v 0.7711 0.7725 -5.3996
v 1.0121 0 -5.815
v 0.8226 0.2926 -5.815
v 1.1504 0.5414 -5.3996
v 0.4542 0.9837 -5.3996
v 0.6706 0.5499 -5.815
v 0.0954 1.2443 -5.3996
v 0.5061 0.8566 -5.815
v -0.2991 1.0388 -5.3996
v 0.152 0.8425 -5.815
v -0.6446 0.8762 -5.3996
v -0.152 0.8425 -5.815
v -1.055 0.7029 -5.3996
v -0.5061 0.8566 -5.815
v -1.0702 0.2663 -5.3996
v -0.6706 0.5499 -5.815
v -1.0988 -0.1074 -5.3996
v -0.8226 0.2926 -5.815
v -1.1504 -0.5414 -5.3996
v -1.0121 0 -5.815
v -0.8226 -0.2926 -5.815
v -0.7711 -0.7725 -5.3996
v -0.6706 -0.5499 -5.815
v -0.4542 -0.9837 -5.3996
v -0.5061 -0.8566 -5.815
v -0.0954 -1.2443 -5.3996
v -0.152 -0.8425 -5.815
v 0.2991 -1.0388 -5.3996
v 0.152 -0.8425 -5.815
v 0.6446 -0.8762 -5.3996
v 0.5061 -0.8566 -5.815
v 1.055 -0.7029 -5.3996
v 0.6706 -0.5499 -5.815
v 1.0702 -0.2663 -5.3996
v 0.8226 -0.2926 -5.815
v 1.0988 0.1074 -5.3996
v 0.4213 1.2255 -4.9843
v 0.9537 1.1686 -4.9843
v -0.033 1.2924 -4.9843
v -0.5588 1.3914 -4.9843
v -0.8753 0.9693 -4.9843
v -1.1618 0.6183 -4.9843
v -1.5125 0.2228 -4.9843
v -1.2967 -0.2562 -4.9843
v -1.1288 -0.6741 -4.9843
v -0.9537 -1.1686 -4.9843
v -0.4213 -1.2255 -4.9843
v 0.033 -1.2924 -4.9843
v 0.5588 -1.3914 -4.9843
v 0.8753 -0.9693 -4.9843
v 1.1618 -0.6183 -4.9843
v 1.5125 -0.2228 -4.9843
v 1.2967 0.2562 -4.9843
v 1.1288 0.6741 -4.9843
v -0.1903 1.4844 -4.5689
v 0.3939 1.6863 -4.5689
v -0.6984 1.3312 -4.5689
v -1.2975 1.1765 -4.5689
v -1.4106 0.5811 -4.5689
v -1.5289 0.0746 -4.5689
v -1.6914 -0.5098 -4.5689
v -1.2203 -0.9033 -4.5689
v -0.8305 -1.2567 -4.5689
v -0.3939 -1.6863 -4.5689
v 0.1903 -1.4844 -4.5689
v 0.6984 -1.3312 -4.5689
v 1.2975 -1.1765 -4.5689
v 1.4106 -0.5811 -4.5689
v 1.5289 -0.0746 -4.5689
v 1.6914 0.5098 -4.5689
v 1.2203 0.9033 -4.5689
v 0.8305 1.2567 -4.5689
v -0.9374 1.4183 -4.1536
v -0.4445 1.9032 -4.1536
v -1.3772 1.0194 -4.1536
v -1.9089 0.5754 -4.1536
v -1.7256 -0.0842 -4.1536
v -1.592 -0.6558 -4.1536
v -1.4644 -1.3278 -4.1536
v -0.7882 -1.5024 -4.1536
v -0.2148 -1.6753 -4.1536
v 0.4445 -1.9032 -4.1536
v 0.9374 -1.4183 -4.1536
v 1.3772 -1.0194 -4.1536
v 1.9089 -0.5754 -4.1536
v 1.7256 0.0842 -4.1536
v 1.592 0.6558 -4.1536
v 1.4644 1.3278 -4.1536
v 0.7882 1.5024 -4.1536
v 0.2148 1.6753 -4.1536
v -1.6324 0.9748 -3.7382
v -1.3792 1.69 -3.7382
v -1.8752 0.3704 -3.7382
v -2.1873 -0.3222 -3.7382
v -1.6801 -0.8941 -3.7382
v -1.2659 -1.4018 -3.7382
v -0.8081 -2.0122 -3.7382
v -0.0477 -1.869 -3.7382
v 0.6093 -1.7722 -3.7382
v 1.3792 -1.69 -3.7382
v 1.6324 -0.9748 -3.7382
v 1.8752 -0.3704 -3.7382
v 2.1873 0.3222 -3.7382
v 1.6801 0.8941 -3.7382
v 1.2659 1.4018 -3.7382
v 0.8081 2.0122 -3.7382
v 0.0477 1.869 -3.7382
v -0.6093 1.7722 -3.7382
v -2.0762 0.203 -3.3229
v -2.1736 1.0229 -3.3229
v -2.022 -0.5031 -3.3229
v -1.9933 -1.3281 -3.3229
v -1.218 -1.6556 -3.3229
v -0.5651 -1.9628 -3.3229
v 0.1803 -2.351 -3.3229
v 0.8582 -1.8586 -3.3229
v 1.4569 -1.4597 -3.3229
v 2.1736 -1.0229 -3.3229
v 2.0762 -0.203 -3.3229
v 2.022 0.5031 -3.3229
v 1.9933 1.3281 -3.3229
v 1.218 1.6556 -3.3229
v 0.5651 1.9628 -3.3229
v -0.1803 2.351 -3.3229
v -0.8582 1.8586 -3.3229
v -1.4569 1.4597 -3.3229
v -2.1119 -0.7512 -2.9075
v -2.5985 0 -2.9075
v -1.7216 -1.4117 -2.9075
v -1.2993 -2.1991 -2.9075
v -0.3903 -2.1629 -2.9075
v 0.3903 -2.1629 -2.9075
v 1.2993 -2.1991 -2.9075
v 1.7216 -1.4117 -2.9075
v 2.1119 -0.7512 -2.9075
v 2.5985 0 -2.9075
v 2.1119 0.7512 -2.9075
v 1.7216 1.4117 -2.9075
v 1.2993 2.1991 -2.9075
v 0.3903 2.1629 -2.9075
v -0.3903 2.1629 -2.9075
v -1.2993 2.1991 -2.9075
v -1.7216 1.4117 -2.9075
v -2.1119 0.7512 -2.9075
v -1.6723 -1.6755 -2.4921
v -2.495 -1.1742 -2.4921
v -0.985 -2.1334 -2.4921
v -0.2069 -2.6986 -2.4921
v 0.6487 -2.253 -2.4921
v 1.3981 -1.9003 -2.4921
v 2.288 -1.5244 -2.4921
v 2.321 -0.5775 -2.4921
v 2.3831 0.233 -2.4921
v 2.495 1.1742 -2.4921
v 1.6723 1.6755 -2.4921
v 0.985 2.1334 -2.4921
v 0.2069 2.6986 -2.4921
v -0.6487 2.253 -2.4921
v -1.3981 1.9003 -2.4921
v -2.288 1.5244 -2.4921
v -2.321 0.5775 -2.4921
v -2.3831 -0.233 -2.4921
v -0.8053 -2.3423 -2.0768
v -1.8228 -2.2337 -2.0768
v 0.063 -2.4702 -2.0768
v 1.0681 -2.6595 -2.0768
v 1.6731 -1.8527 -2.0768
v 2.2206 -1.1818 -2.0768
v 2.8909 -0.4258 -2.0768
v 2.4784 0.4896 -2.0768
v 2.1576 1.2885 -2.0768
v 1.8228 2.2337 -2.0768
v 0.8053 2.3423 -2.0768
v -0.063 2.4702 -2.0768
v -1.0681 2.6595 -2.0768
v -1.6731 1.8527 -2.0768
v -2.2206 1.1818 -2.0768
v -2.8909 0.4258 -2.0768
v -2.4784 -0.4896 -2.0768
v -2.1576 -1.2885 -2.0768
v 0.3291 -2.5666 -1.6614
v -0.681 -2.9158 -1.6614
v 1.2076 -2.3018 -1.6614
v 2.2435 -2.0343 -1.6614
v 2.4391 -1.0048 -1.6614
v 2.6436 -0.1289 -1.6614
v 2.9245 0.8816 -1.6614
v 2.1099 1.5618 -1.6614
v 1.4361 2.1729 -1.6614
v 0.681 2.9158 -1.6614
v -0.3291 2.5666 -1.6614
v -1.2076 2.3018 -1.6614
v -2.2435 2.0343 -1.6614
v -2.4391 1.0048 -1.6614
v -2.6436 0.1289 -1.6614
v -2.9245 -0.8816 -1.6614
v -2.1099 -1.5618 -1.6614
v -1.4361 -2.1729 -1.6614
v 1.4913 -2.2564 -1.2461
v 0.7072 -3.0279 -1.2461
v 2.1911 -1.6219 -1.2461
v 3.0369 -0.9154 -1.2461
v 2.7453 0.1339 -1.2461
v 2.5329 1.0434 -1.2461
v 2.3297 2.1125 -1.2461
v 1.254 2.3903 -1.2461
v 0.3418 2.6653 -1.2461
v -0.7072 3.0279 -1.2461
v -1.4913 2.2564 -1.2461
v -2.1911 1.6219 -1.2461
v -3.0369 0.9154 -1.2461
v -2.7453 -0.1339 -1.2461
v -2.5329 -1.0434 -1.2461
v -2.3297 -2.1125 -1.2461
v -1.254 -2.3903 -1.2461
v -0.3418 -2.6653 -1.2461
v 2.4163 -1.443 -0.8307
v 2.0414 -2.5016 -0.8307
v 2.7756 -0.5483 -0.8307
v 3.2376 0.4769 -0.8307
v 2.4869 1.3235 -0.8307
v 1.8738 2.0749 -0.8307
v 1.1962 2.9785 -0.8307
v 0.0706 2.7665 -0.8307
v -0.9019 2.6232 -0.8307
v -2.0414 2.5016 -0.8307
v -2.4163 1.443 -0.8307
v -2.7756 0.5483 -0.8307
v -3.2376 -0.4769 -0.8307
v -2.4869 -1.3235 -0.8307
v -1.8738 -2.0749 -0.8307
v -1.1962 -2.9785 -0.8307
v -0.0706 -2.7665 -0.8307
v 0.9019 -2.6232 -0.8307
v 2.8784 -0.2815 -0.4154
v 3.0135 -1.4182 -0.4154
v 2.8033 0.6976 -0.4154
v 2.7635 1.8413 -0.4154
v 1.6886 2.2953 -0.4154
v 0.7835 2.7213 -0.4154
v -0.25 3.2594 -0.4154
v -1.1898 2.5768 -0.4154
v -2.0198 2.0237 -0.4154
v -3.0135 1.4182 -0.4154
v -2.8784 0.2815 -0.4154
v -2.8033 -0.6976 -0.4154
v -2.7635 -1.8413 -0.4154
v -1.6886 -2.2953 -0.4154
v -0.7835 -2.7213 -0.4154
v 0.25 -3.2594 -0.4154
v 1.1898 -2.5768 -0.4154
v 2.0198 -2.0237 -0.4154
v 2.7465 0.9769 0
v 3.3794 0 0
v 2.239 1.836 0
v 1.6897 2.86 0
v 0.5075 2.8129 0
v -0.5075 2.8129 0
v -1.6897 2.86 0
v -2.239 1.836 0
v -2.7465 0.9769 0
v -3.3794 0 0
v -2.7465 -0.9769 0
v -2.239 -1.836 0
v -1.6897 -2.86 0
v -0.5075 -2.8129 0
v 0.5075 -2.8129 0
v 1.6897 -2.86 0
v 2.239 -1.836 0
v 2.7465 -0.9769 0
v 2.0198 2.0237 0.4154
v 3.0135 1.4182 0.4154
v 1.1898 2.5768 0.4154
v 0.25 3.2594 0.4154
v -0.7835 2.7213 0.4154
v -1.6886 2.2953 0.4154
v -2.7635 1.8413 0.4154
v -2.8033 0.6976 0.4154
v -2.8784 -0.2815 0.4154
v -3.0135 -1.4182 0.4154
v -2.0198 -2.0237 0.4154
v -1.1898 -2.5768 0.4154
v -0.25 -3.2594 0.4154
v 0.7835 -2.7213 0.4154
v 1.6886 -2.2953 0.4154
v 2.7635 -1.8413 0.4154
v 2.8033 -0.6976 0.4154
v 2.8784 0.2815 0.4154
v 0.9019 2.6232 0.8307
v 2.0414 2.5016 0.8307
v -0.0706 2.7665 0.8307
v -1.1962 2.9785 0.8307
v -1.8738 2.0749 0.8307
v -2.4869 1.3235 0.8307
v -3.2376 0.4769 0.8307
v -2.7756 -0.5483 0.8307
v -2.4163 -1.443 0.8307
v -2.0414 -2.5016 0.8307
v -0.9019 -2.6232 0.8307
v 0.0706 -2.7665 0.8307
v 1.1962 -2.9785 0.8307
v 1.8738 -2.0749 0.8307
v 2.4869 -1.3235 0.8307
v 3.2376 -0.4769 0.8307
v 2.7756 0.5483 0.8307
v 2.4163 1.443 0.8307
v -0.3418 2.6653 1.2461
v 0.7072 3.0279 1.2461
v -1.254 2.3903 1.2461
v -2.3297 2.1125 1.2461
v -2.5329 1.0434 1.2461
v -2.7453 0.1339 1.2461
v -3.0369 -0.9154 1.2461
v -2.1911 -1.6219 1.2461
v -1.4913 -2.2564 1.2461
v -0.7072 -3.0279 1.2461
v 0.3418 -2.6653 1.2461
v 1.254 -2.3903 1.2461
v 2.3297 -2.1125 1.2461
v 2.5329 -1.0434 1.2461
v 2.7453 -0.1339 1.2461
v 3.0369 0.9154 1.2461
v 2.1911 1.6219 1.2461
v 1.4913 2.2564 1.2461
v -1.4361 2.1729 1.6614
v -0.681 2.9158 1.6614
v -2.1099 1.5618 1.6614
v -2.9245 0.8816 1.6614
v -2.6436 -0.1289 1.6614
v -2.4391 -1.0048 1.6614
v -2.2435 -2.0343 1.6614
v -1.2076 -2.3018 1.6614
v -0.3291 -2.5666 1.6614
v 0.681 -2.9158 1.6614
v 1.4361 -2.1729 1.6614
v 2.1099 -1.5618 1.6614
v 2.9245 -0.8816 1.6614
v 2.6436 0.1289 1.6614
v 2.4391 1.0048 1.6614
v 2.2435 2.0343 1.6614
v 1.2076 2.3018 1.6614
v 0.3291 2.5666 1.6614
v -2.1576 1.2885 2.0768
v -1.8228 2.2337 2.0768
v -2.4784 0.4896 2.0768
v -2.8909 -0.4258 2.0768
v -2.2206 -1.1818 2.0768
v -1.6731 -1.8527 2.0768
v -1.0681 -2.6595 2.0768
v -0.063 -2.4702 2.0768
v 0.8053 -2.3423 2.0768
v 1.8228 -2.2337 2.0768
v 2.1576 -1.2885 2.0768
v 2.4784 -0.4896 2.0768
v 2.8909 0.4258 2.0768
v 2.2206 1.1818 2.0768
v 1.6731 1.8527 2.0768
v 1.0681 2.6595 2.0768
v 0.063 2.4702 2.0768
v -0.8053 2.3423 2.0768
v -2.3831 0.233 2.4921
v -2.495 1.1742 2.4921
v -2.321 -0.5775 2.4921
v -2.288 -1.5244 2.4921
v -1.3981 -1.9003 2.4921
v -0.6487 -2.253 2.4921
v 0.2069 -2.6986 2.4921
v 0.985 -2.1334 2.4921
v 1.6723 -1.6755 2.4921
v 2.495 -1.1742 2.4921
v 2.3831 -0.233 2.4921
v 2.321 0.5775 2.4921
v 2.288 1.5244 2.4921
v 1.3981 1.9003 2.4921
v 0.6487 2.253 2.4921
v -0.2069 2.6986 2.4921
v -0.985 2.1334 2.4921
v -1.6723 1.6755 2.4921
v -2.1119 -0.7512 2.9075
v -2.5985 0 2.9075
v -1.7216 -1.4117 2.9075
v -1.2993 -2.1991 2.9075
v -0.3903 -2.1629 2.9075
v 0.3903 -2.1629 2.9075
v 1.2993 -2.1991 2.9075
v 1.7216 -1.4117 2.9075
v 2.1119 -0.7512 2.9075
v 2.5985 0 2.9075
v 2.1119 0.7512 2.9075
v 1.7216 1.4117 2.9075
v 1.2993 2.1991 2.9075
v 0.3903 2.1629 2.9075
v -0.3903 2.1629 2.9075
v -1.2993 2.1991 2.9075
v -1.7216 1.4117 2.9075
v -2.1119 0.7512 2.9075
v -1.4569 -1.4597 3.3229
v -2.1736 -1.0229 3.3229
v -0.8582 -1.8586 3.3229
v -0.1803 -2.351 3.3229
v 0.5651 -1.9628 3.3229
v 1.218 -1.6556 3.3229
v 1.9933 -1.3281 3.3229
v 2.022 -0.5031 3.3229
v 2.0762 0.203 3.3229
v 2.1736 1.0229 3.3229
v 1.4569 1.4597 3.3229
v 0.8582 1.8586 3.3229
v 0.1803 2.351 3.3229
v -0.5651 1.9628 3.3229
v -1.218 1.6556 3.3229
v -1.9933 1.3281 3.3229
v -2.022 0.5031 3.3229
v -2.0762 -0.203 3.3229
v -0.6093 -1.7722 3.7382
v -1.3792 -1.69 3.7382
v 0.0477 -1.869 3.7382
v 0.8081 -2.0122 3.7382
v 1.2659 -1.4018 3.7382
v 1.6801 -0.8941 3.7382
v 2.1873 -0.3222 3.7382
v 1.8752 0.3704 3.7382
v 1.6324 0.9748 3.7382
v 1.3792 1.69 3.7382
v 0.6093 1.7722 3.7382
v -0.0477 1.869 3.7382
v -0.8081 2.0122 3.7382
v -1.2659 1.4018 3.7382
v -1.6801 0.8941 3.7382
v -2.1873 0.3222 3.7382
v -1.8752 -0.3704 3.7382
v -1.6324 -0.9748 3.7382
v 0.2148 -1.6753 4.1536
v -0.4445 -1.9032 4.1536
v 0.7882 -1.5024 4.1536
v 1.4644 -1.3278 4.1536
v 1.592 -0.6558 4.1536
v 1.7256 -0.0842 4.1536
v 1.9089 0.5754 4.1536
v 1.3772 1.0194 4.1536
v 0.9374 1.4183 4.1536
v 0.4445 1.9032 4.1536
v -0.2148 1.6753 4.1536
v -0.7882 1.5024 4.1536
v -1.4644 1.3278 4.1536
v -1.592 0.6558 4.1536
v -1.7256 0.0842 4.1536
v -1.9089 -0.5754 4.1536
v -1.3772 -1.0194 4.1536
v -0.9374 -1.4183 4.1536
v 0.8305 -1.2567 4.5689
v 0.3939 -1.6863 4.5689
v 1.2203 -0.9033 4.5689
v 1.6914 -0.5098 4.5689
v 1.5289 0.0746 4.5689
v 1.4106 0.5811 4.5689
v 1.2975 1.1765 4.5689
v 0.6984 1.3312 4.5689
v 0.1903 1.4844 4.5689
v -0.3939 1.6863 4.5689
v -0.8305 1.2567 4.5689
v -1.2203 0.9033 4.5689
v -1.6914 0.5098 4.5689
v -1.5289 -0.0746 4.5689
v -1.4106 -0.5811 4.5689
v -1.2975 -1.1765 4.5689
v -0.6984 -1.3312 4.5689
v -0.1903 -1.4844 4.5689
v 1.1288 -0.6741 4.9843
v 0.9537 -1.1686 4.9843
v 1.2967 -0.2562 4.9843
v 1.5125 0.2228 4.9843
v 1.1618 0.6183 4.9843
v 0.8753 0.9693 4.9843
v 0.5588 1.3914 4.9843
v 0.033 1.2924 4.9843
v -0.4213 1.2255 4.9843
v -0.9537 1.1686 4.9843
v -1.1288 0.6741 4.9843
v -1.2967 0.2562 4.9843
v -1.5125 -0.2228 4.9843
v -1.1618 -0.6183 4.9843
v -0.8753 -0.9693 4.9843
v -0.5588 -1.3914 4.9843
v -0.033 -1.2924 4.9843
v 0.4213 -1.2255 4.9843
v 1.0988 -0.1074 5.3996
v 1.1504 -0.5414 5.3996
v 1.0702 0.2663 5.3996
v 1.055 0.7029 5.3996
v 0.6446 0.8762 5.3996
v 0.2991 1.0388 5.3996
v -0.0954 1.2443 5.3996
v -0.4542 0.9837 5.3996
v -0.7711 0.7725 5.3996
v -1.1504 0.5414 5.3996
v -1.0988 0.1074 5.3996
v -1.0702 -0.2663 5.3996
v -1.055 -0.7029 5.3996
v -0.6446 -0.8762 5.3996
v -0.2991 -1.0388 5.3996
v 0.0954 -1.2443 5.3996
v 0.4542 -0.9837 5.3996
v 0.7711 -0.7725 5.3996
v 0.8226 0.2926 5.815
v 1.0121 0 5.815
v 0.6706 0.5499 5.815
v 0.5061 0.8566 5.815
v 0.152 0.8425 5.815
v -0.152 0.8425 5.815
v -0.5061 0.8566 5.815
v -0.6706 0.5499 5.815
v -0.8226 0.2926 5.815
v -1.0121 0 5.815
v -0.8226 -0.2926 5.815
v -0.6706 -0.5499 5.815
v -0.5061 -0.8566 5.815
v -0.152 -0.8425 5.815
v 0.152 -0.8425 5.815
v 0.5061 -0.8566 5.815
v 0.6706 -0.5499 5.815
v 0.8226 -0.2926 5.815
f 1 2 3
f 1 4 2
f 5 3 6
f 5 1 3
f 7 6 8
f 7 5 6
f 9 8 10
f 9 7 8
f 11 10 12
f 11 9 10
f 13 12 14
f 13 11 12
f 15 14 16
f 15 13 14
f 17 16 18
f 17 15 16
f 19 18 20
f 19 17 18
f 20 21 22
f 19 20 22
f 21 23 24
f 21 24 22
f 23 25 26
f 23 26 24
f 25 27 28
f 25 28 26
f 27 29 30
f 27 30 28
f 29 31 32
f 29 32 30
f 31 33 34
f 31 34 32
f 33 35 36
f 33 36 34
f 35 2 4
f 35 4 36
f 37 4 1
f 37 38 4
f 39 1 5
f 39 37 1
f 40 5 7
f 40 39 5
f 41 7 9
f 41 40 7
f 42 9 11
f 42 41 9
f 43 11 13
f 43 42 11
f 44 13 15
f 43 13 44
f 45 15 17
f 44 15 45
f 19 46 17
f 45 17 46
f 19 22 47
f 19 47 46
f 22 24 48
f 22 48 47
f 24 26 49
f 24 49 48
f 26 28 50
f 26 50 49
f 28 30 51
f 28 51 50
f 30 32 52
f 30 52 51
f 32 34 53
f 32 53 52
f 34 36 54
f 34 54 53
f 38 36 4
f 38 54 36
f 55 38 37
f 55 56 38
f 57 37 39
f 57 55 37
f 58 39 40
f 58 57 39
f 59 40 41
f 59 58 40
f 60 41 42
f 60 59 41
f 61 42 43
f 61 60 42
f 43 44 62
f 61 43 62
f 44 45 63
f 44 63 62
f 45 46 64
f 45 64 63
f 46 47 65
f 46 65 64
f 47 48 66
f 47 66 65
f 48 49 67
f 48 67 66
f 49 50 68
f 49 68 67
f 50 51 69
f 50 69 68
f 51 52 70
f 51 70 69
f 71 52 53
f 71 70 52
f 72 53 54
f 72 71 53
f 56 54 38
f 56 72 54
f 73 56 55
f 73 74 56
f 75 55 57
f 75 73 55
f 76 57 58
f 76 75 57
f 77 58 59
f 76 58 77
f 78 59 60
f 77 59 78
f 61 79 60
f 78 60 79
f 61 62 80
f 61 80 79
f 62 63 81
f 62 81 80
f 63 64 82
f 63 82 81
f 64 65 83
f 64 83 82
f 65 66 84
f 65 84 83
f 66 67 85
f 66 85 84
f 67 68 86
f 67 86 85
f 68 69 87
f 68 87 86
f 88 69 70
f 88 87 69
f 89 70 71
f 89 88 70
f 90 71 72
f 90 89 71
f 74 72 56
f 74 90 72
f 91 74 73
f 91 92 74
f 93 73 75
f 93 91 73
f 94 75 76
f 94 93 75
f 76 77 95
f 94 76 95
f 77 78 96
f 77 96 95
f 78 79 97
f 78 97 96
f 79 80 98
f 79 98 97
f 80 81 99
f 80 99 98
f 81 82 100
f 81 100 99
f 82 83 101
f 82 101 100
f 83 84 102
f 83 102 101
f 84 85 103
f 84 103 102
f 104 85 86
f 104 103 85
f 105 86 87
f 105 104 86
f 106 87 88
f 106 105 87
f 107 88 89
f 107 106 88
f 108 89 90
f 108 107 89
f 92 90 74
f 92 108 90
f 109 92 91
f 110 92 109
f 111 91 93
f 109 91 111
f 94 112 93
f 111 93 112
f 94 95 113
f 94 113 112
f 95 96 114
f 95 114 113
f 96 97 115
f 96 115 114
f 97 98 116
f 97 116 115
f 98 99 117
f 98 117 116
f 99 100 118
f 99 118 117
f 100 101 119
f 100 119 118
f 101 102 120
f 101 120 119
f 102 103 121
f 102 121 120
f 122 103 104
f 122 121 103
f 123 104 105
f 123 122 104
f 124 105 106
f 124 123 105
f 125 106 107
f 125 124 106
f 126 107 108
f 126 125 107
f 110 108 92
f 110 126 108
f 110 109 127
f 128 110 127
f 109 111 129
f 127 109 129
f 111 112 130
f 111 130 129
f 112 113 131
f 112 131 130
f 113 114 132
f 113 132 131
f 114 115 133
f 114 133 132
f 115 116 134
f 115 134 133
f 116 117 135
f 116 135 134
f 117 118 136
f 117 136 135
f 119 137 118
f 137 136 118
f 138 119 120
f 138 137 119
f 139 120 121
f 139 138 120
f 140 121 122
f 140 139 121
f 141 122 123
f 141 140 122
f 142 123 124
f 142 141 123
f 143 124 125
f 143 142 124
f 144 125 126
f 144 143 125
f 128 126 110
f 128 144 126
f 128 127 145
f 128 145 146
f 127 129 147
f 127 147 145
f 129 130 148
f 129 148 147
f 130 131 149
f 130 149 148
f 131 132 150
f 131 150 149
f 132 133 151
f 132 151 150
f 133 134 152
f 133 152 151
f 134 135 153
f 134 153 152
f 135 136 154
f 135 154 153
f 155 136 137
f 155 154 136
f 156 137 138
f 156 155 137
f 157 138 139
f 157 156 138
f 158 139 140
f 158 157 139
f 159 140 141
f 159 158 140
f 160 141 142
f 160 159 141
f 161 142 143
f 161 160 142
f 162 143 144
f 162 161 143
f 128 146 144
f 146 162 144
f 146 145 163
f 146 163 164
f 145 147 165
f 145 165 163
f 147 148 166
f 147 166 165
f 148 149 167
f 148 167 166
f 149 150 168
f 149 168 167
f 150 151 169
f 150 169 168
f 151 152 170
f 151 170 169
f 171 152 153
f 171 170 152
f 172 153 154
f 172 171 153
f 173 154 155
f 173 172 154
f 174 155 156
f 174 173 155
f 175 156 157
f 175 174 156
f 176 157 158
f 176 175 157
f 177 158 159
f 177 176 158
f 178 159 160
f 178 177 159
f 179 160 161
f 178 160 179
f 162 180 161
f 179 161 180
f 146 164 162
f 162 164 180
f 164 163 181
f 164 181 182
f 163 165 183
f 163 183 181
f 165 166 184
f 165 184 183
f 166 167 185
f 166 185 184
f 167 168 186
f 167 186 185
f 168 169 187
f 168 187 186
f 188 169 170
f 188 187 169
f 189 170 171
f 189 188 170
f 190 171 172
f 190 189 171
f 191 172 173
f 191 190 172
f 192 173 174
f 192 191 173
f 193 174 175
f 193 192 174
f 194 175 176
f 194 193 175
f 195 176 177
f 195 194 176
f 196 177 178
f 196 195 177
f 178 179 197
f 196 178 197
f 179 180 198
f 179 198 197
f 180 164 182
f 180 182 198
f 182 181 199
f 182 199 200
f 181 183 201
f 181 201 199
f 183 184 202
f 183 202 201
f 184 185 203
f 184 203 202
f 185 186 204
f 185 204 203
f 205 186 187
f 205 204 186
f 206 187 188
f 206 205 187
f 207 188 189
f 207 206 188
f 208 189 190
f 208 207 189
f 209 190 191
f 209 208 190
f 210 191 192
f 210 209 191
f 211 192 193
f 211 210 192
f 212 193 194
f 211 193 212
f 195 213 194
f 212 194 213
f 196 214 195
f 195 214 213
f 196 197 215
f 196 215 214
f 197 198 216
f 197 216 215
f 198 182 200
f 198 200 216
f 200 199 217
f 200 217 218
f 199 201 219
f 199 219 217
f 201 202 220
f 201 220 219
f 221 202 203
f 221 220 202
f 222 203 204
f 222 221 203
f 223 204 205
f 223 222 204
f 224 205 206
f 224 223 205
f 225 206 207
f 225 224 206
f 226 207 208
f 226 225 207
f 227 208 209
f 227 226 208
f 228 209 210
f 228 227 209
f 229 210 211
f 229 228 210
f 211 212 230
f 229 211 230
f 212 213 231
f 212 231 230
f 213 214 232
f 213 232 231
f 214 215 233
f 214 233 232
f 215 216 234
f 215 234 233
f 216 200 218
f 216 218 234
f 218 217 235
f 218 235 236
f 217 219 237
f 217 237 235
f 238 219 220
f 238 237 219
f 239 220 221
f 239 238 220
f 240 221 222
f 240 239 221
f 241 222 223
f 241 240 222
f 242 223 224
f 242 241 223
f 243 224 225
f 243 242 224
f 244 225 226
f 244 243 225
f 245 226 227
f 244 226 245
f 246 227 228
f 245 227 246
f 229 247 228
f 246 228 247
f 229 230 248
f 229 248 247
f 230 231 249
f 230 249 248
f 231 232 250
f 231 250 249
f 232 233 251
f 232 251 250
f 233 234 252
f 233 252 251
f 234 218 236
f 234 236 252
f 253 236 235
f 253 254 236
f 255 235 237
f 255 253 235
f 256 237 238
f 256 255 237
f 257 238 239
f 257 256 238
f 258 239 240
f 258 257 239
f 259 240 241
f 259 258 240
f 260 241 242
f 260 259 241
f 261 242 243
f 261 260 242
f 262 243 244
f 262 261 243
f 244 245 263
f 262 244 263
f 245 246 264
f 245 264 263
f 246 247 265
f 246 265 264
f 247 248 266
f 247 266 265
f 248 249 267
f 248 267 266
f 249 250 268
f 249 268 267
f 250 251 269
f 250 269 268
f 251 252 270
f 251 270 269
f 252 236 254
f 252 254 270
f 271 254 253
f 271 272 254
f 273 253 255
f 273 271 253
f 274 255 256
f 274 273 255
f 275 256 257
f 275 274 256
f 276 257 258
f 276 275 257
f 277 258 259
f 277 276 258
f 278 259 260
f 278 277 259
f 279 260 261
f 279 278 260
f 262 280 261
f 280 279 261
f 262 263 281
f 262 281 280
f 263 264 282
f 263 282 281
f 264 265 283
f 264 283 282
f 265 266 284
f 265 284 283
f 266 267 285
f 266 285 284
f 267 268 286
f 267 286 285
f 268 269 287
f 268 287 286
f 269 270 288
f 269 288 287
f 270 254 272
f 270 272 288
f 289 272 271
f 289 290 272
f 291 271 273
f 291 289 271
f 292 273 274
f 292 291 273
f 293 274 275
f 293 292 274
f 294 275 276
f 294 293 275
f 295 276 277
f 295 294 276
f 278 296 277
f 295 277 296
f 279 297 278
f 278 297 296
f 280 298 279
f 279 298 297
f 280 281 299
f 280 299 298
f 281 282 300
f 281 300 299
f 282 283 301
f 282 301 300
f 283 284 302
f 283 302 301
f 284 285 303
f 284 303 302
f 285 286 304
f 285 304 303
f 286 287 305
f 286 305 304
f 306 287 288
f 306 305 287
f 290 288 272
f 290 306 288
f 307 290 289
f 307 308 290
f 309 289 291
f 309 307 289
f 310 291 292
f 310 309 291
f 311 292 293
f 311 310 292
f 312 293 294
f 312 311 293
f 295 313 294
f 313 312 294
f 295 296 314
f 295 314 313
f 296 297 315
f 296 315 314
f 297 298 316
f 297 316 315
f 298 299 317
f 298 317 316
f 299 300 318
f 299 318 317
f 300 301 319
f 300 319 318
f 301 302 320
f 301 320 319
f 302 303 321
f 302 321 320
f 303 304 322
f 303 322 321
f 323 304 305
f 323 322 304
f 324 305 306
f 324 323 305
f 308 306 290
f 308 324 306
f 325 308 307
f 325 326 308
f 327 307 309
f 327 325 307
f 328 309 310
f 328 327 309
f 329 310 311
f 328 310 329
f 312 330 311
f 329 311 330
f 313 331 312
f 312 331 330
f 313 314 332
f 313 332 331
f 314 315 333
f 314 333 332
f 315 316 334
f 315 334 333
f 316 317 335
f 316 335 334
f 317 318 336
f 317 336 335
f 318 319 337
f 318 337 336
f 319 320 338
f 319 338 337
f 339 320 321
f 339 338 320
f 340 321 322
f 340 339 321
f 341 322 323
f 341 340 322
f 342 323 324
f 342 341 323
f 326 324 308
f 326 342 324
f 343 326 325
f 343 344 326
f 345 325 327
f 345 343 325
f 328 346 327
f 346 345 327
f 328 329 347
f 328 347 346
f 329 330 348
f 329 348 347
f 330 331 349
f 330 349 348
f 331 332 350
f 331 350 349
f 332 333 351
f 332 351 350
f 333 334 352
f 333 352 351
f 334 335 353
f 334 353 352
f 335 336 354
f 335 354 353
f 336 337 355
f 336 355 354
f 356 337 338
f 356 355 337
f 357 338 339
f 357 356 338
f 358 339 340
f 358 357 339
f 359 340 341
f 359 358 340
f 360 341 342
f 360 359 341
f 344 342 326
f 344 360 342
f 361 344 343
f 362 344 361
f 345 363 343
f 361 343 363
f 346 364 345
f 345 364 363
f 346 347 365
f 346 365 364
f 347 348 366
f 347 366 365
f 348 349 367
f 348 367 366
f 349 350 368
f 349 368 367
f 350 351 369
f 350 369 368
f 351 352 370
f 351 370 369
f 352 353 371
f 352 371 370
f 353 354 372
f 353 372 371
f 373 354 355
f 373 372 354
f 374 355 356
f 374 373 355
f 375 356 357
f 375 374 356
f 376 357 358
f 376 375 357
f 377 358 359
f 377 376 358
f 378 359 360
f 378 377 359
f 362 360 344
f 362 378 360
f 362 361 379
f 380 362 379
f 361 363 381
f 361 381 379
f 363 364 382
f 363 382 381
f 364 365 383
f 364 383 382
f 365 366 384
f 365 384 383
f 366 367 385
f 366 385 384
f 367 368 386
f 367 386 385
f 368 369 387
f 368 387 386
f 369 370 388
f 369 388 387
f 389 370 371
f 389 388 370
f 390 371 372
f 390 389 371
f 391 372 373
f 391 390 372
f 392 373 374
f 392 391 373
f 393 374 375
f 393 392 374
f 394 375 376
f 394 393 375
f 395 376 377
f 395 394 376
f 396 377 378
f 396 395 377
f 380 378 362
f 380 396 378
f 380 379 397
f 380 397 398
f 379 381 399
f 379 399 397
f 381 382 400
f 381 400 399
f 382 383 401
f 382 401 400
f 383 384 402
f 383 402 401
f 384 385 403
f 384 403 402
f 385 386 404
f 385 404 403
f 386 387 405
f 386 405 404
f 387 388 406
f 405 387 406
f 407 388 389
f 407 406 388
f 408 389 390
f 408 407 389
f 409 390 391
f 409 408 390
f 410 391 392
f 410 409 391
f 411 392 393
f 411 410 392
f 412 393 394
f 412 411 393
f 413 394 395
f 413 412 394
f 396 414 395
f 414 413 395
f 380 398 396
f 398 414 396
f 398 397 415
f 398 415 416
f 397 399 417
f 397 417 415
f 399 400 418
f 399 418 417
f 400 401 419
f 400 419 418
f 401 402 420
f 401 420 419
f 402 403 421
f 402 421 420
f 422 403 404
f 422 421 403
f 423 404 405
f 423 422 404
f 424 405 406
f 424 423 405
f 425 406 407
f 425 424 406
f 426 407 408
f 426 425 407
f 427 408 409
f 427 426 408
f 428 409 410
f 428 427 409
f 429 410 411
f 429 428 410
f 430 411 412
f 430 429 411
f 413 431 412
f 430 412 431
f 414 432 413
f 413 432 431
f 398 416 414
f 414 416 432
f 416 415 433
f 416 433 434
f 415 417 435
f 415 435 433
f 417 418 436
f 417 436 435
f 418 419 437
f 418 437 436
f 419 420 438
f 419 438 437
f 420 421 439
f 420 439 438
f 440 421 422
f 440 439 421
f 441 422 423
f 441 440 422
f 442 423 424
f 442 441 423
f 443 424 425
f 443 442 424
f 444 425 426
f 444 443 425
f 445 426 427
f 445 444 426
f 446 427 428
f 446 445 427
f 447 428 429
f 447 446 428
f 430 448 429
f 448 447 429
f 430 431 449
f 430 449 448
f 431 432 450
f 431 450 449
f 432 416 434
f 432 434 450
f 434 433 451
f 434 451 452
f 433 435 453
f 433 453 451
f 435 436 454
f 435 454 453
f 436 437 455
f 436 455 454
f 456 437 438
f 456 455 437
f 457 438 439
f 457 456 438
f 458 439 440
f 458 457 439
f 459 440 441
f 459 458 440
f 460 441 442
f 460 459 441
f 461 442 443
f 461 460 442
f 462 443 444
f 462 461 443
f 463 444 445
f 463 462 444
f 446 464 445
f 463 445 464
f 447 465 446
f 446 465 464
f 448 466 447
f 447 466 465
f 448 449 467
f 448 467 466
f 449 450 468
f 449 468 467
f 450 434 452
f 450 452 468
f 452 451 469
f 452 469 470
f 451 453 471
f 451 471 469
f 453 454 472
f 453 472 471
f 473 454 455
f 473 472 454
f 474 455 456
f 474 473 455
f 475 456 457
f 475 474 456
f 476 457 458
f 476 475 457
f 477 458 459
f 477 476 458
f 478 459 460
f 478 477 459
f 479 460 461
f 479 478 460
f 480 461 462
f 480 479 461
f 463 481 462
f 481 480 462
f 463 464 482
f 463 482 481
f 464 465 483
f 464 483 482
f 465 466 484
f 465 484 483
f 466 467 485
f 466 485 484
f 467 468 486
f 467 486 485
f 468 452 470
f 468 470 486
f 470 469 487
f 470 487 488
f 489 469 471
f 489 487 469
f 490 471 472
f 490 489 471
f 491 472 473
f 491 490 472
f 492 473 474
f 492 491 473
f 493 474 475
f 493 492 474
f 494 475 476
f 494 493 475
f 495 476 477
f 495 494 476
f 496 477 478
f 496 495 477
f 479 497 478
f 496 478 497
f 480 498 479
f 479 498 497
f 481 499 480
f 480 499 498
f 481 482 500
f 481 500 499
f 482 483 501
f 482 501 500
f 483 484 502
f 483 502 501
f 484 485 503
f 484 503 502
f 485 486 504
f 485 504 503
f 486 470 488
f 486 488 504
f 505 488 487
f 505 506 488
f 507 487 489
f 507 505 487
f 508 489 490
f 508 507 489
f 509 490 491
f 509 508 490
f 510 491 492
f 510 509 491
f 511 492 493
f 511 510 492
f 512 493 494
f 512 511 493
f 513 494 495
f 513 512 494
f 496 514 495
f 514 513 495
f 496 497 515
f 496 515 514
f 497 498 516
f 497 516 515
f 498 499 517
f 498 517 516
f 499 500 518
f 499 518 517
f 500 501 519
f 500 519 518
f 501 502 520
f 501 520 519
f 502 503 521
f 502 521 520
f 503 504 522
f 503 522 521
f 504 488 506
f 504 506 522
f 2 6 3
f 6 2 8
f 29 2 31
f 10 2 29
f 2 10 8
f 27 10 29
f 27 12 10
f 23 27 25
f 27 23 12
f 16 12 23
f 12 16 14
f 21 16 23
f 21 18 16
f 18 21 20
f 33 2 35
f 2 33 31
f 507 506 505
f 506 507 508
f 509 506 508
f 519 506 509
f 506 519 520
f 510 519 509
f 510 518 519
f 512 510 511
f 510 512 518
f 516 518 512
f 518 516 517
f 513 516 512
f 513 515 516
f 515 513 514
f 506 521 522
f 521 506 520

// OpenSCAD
// Faceted low-poly spiral/rosette solid with tapered silhouette and central vortex depression
// Bounding box target: ~6.2 x 6.0 x 11.6 mm
// Fixed: removed expensive minkowski(); kept faceted look and vortex subtraction

// Parameters
bbox_x = 6.15; //[3.08:12.3:0.01]
bbox_y = 6.01; //[3.01:12.02:0.01]
bbox_z = 11.63; //[5.82:23.26:0.01]

z_height = bbox_z; //[5.82:23.26:0.01]
r_max_x = bbox_x/2; //[1.54:6.15:0.01]
r_max_y = bbox_y/2; //[1.5:6.01:0.01]

r_min = 0.9; //[0.45:1.8:0.01]
twist_deg = 720; //[180:1080:1]
facets_around = 18; //[8:48:1]
slices_z = 28; //[10:80:1]

depression_depth = 4.2; //[2.1:8.4:0.01]
depression_r0 = 0.55; //[0.3:1.2:0.01]
depression_r1 = 2.25; //[1.1:4.4:0.01]

profile_power = 1.6; //[0.8:3.2:0.01]
micro_facet_amp = 0.18; //[0.0:0.5:0.01]
rosette_lobes = 6; //[3:12:1]

overlap = 0.25; //[0.05:1.0:0.01]
eps = 0.03; //[0.02:0.2:0.01]

// Helpers
function lerp(a,b,t) = a + (b-a)*t;

// Radius profile: large at mid-height, tapered at top/bottom
function radial_scale(t) =
    let(u = abs(2*t - 1)) // 0 at mid, 1 at ends
    lerp(1.0, r_min/min(r_max_x,r_max_y), pow(u, profile_power));

// Slight rosette waviness
function rosette_scale(a_deg) =
    1 + micro_facet_amp * 0.55 * cos(rosette_lobes * a_deg);

// Twisted, faceted outer surface via polyhedron (triangulated)
module faceted_twisted_body() {
    n = facets_around;
    m = slices_z;
    H = z_height;
    rx = r_max_x;
    ry = r_max_y;

    pts = [
        for (j = [0:m])
            let(t = j/m,
                z = -H/2 + H*t,
                s = radial_scale(t),
                phi = twist_deg * t)
            for (i = [0:n-1])
                let(a = 360*i/n + phi,
                    rr = rosette_scale(360*i/n),
                    x = rx * s * rr * cos(a),
                    y = ry * s * rr * sin(a))
                [x,y,z]
    ];

    side_faces = [
        for (j = [0:m-1], i = [0:n-1])
            let(i2 = (i+1)%n,
                a = j*n + i,
                b = j*n + i2,
                c = (j+1)*n + i2,
                d = (j+1)*n + i)
            each [[a,b,c],[a,c,d]]
    ];

    // Caps (triangulated fan using first vertex of each ring)
    bottom_faces = [
        for (i = [1:n-2])
            [0, i+1, i]
    ];
    top0 = m*n;
    top_faces = [
        for (i = [1:n-2])
            [top0, top0+i, top0+i+1]
    ];

    polyhedron(points = pts, faces = concat(side_faces, bottom_faces, top_faces), convexity = 10);
}

// Central vortex-like depression: twisted, faceted "funnel" subtracted from the top
module vortex_depression() {
    n = facets_around;
    m = max(10, floor(slices_z*0.75));
    H = depression_depth;
    z_top = z_height/2;

    z0 = z_top - overlap;
    z1 = z0 - H - eps;

    pts = [
        for (j = [0:m])
            let(t = j/m,
                z = lerp(z0, z1, t),
                r = lerp(depression_r1, depression_r0, pow(t, 1.15)),
                phi = (twist_deg*0.55) * t + 120*t*t)
            for (i = [0:n-1])
                let(a = 360*i/n + phi,
                    rr = 1 + 0.10*cos(3*(360*i/n)))
                [r*rr*cos(a), r*rr*sin(a), z]
    ];

    side_faces = [
        for (j = [0:m-1], i = [0:n-1])
            let(i2 = (i+1)%n,
                a = j*n + i,
                b = j*n + i2,
                c = (j+1)*n + i2,
                d = (j+1)*n + i)
            each [[a,b,c],[a,c,d]]
    ];

    // Cap the bottom (ring j=m) to make a closed solid
    base = m*n;
    bottom_faces = [
        for (i = [1:n-2])
            [base, base+i, base+i+1]
    ];

    polyhedron(points = pts, faces = concat(side_faces, bottom_faces), convexity = 10);
}

// Final (no minkowski; keep crisp low-poly facets for fast render)
difference() {
    faceted_twisted_body();
    vortex_depression();
}
